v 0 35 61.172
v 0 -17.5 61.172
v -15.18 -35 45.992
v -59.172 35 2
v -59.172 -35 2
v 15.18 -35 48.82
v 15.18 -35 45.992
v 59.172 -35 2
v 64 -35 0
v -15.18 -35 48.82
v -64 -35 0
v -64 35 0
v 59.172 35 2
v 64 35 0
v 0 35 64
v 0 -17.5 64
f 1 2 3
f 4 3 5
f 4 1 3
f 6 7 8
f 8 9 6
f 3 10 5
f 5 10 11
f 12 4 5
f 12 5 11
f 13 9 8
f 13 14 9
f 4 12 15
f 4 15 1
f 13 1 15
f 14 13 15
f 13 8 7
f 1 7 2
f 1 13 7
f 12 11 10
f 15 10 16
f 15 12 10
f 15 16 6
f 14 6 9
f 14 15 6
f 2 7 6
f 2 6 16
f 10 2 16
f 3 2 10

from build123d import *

# Parameters (mm, degrees)
BOSS_EXTRUDE1_DEPTH     = 35
CUT_EXTRUDE3_DEPTH      = 96.198576189
CUT_EXTRUDE3_DEPTH_BACK = 96.198576189


with BuildPart() as part:
    # Sketch1 → Boss-Extrude1 (new, symmetric)
    with BuildSketch(Plane(origin=(0, 0, 0), x_dir=(1, 0, 0), z_dir=(0, 1, 0))):
        Polygon((-1.105e-06, -61.171572908), (-59.171572937, -2), (-64, 0), (-1.131e-06, -64.000000033), (64.000000066, 0), (59.171572879, -2), align=None)
    extrude(amount=BOSS_EXTRUDE1_DEPTH, both=True)

    # Sketch4 → Cut-Extrude3 (cut, two sides: drawn at the far end of the back side and taken through both)
    with BuildSketch(Plane.XY.offset(61.17).offset(-CUT_EXTRUDE3_DEPTH_BACK)):
        Polygon((-15.180001131, -35), (15.179998869, -35), (-1.131e-06, -17.5), align=None)
    extrude(amount=CUT_EXTRUDE3_DEPTH + CUT_EXTRUDE3_DEPTH_BACK, mode=Mode.SUBTRACT)


solid = part.part
